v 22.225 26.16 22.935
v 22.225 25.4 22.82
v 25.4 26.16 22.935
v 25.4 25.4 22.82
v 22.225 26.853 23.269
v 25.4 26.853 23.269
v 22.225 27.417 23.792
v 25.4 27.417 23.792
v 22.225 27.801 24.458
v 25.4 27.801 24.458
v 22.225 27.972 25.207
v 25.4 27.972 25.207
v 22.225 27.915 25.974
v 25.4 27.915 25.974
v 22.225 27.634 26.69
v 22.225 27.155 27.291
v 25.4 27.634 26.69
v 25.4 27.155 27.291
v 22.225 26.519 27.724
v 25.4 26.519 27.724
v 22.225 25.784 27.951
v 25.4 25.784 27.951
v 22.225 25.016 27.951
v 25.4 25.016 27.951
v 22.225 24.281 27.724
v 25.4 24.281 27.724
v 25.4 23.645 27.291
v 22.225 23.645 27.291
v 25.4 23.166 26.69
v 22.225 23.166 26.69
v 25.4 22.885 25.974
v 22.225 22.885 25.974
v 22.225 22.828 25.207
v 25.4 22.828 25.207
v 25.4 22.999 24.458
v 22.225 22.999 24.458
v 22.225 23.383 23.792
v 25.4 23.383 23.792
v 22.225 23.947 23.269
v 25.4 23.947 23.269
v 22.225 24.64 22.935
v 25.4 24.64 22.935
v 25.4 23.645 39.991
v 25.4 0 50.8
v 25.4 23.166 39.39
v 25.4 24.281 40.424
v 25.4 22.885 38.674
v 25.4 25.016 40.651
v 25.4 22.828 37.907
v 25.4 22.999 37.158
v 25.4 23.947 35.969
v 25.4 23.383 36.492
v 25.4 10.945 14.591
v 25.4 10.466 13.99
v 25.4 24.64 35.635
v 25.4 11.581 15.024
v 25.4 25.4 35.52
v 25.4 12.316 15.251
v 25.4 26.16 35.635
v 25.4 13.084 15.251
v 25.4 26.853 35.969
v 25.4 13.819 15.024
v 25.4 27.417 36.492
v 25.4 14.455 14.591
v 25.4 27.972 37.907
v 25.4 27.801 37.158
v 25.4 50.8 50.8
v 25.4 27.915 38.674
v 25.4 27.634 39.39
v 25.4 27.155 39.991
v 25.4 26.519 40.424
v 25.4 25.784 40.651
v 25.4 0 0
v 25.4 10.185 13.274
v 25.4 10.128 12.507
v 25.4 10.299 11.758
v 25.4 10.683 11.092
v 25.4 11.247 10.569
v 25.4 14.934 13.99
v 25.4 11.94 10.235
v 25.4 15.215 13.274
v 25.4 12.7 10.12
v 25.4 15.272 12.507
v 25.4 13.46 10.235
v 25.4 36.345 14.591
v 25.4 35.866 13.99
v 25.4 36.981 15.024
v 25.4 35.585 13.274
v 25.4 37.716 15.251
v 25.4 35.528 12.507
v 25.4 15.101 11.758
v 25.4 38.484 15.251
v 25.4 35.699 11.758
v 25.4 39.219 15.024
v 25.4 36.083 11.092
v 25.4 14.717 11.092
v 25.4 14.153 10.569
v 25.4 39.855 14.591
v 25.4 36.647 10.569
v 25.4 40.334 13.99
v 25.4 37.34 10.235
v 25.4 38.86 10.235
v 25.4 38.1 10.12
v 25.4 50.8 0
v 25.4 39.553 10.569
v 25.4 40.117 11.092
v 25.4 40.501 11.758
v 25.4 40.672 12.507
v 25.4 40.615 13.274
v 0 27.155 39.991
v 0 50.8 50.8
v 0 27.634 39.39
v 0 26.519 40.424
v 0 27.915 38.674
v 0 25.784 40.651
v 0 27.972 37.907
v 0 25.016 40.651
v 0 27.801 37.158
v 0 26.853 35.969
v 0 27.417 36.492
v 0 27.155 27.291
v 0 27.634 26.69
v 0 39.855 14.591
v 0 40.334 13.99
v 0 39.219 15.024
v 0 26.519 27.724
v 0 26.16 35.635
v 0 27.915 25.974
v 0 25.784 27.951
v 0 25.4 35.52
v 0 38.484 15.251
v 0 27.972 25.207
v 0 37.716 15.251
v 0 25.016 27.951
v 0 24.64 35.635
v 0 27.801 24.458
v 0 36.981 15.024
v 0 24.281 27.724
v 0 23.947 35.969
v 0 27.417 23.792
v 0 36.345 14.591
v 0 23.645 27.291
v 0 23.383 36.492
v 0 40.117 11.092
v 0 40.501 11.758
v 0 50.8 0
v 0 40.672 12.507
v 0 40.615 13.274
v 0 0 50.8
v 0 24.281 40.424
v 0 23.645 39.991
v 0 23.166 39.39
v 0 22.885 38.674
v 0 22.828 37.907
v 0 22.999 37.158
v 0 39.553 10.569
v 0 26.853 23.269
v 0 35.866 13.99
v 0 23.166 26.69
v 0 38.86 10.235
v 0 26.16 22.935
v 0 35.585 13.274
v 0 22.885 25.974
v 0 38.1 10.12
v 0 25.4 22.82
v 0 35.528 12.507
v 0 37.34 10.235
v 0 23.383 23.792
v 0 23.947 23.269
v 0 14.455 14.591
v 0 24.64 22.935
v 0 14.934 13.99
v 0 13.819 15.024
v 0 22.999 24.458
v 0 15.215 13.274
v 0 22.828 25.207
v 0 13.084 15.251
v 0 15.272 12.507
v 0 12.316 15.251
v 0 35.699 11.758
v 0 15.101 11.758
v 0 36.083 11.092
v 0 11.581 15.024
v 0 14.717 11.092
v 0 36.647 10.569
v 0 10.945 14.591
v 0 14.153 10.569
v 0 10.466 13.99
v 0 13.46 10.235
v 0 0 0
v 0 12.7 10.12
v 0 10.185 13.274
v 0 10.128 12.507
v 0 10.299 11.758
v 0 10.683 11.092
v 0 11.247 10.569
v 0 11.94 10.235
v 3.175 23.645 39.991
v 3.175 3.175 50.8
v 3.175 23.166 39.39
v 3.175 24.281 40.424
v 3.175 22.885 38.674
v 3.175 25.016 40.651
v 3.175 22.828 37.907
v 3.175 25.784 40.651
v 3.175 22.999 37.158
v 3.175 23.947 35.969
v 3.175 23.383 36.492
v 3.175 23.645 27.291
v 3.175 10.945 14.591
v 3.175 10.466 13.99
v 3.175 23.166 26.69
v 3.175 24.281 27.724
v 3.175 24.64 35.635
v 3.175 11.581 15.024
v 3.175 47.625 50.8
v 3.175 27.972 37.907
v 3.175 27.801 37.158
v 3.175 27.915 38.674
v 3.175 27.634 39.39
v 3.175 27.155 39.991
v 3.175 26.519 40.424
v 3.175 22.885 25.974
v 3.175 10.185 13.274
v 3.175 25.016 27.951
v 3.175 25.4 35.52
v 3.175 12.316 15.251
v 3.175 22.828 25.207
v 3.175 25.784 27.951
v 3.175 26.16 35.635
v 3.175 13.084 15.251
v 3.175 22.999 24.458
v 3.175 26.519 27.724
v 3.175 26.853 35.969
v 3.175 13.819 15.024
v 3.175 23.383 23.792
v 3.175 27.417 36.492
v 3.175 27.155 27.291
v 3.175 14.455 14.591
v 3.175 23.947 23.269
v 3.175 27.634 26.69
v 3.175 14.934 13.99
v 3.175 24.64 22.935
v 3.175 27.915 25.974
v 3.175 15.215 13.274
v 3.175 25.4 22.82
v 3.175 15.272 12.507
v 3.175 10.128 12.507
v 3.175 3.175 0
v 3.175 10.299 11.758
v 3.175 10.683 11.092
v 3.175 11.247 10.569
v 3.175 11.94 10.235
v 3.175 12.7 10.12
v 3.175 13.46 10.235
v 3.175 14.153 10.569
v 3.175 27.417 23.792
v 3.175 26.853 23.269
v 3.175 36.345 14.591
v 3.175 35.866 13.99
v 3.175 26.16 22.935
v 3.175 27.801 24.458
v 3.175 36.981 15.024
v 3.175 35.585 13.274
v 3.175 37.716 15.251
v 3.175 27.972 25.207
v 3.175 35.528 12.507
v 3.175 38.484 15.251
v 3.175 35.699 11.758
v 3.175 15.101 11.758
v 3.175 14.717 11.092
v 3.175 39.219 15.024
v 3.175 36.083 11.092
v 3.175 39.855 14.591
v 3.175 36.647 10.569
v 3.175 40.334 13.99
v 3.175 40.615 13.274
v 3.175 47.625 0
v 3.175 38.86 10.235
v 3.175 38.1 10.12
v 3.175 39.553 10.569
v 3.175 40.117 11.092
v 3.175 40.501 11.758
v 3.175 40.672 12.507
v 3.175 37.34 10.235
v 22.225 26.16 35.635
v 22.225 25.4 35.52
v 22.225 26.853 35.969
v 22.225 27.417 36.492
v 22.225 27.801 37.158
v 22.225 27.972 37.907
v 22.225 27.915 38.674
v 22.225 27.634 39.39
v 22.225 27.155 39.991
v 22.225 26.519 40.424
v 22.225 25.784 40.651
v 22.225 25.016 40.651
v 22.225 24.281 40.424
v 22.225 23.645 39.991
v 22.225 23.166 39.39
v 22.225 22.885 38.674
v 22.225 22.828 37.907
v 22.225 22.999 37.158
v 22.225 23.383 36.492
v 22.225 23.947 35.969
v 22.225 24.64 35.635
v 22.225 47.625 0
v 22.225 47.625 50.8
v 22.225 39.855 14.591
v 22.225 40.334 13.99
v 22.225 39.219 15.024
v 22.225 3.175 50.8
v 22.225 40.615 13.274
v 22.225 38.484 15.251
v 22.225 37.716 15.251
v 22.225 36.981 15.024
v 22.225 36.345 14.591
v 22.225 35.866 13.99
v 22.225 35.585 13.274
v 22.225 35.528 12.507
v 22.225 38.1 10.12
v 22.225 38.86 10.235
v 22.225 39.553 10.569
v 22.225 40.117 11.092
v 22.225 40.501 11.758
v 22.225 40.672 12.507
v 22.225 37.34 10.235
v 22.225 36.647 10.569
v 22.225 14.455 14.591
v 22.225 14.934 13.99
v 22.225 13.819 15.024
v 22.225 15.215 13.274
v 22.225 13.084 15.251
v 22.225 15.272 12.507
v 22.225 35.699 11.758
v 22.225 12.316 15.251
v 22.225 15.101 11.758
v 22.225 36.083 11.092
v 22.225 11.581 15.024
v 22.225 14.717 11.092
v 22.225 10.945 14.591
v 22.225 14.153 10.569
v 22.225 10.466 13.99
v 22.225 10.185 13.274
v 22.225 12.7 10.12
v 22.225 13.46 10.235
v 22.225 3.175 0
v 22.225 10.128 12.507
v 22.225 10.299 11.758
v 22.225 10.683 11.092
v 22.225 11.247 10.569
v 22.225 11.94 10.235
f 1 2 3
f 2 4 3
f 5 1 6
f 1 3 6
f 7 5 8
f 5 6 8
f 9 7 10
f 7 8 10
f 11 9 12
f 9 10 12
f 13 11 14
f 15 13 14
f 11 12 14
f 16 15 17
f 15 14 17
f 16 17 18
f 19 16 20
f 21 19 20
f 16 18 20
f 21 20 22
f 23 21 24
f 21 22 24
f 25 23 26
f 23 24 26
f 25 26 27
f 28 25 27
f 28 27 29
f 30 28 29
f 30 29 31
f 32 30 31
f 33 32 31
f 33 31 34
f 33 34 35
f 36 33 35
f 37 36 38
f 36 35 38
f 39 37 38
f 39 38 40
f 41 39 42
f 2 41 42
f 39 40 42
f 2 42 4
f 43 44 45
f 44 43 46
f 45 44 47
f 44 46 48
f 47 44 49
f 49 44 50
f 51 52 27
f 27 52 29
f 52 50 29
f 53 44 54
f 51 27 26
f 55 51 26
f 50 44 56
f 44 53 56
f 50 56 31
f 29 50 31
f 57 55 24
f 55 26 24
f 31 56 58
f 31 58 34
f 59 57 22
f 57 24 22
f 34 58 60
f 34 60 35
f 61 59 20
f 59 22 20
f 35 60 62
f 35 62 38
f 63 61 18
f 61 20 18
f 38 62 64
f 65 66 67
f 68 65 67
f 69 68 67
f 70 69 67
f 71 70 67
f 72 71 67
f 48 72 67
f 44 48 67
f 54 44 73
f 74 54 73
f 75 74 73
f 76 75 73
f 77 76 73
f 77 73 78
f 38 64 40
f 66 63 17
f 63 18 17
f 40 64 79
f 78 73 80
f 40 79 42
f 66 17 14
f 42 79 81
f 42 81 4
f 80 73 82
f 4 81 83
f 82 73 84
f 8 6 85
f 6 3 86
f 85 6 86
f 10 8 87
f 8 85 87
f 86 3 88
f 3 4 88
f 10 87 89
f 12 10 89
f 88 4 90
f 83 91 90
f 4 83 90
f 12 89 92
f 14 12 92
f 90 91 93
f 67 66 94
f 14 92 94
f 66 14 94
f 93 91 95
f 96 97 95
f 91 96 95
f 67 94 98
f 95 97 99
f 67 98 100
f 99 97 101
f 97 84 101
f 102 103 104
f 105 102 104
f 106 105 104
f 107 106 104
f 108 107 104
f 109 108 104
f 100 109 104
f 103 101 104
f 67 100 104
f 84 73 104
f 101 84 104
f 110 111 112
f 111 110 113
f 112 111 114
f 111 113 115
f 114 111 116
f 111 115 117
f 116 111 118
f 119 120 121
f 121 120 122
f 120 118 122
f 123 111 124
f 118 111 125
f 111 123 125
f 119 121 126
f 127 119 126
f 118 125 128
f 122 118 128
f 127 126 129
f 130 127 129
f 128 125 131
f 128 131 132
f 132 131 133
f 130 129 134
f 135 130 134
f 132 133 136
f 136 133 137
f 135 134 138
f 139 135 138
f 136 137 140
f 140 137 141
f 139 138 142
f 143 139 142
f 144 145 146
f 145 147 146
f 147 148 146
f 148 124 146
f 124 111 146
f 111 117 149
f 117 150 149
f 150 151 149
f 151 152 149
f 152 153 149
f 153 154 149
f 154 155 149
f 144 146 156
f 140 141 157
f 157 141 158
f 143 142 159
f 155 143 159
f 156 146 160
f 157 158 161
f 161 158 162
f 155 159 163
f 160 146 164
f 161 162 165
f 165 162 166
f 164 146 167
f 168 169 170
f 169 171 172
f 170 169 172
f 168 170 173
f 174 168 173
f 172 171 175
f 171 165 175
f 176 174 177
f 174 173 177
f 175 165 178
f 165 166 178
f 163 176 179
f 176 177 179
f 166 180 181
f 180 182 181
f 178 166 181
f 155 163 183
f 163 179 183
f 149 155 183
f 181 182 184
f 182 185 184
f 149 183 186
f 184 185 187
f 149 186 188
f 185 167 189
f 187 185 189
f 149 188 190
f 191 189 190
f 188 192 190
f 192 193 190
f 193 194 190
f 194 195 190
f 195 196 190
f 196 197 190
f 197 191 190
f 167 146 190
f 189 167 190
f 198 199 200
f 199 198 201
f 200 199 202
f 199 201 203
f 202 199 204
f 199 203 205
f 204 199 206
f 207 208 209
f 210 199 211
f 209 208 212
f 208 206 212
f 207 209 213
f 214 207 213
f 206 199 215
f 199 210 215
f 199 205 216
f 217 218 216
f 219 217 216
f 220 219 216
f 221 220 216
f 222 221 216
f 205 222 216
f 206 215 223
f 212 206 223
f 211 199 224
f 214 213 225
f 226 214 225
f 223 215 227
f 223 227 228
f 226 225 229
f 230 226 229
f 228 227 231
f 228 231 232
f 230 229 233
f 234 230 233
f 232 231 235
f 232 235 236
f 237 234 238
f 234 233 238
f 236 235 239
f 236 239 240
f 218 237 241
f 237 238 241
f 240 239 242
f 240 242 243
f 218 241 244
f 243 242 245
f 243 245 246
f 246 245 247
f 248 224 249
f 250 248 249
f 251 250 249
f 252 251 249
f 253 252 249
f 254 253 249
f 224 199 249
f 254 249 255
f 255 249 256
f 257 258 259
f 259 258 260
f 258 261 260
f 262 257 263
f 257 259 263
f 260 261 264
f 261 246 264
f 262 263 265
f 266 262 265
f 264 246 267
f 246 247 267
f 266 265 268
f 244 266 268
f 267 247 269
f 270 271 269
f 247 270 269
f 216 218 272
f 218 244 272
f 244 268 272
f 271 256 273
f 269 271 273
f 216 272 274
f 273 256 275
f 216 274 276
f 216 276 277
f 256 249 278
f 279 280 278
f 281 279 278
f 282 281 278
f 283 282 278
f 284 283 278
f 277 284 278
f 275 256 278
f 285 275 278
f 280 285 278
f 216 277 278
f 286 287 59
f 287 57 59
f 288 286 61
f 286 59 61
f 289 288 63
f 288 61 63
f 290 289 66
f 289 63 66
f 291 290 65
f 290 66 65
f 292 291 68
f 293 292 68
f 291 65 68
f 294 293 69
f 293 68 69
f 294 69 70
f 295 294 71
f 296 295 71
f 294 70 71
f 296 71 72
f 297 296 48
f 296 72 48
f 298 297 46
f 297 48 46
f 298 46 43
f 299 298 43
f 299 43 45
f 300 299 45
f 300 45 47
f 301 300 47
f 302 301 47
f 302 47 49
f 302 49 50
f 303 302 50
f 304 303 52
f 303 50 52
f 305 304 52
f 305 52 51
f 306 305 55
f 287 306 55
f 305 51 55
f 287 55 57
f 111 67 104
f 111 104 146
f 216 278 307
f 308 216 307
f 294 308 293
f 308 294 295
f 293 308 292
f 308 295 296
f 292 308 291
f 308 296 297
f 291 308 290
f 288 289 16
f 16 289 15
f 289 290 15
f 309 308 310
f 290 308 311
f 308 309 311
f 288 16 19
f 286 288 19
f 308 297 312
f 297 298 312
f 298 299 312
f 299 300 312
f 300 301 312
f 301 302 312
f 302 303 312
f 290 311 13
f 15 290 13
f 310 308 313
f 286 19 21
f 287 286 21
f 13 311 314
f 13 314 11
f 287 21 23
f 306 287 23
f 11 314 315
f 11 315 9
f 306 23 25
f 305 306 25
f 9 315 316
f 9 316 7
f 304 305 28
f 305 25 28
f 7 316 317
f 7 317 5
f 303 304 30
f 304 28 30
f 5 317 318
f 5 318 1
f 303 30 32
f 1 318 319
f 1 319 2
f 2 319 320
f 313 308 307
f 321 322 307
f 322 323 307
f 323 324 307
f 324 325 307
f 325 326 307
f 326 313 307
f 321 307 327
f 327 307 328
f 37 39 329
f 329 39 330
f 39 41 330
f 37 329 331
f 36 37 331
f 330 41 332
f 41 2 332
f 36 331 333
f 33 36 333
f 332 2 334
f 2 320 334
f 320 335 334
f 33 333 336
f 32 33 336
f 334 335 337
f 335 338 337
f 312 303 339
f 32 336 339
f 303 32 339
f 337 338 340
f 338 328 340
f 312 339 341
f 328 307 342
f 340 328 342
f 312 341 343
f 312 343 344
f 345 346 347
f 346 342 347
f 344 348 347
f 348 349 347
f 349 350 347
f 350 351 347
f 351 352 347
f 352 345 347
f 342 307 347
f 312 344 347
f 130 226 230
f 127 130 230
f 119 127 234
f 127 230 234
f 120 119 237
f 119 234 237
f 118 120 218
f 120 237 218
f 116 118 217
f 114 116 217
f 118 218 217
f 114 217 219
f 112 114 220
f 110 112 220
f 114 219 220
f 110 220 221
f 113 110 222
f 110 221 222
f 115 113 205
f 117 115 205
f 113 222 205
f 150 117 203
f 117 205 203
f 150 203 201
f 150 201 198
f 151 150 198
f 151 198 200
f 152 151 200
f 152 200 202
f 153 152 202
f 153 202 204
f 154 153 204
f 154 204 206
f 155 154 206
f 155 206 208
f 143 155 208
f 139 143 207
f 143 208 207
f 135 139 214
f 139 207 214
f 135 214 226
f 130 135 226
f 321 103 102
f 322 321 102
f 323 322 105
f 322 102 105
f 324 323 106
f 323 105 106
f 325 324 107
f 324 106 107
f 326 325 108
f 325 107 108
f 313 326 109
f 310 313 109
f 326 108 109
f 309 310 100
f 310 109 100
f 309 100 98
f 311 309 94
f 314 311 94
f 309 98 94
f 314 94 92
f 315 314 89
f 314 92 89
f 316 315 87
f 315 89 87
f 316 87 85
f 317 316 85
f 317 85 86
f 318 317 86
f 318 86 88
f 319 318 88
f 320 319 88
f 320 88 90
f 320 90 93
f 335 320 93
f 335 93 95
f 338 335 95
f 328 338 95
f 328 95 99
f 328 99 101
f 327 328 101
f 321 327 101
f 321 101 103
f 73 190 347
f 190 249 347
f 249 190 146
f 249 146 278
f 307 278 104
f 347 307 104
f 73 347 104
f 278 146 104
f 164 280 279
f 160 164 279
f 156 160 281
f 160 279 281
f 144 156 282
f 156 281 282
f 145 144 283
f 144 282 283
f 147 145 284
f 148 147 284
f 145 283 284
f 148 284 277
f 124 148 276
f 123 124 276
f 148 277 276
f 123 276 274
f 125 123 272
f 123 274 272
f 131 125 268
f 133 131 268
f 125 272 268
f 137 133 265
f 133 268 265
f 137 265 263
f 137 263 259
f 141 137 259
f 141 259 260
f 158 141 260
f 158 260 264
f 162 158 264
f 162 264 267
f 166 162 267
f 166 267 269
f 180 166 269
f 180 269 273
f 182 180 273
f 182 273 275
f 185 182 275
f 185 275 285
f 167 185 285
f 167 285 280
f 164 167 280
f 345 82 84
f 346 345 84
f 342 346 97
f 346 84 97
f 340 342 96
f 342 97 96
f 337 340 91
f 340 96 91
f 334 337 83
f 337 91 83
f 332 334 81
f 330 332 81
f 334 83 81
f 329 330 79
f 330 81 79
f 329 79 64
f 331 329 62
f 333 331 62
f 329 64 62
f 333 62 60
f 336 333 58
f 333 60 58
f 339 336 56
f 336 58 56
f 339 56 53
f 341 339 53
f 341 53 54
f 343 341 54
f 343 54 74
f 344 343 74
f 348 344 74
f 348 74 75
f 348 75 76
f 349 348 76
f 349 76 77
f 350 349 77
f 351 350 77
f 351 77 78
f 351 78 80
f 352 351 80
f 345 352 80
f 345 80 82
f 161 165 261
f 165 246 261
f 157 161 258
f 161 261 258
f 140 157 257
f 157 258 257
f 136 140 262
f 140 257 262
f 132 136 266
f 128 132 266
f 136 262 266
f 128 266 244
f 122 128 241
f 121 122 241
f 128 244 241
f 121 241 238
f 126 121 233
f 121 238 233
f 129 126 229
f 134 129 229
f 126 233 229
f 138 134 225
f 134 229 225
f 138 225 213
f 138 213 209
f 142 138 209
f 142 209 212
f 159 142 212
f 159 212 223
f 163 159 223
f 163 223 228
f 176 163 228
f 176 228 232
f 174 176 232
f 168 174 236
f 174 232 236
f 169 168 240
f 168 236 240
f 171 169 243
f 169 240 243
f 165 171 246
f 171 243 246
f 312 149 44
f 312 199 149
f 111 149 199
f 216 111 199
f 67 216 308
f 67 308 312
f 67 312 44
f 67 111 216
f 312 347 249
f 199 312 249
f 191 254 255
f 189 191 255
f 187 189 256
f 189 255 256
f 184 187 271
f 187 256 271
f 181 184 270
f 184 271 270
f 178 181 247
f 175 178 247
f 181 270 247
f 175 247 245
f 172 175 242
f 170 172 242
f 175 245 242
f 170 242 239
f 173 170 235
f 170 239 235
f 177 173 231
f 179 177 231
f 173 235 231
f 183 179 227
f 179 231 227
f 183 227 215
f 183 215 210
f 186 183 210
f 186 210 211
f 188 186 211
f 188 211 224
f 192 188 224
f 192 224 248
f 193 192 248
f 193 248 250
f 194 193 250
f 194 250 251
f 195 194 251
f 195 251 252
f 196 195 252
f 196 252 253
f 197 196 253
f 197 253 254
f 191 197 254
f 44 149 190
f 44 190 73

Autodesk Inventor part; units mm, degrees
ref_plane "YZ Plane" through (0, 0, 0) normal (1, 0, 0) x (0, 1, 0)
ref_plane "XZ Plane" through (0, 0, 0) normal (0, 1, 0) x (-1, 0, 0)
ref_plane "XY Plane" through (0, 0, 0) normal (0, 0, 1) x (1, 0, 0)
sketch "Sketch1" plane through (0, 0, 0) normal (0, 0, 1) x (1, 0, 0)
  line L0 (0, 0) -> (25.4, 0)
  line L1 (25.4, 0) -> (25.4, 50.8)
  line L2 (25.4, 50.8) -> (0, 50.8)
  line L3 (0, 50.8) -> (0, 0)
  line L4 (3.175, 47.625) -> (22.225, 47.625)
  line L5 (22.225, 47.625) -> (22.225, 3.175)
  line L6 (22.225, 3.175) -> (3.175, 3.175)
  line L7 (3.175, 3.175) -> (3.175, 47.625)
  dimension "d0" = 25.4
  dimension "d1" = 50.8
  dimension "d2" = 3.175
extrude "Extrusion1" add sketch "Sketch1" along normal blind 50.8
sketch "Sketch2" plane through (25.4, 0, 0) normal (1, 0, 0) x (0, 0, -1)
  line L0 (0, 50.8) -> (0, 0) construction
  line L1 (0, 0) -> (-12.7, 0) construction
  line L2 (0, 0) -> (-50.8, 0) construction
  line L3 (-12.7, 0) -> (-12.7, 12.7) construction
  line L4 (-12.7, 12.7) -> (-12.7, 38.1) construction
  circle A0 centre (-12.7, 12.7) radius 2.5797
  circle A1 centre (-12.7, 38.1) radius 2.5797
  dimension "d5" = 12.7
  dimension "d6" = 12.7
  dimension "d7" = 25.4
  dimension "d8" = 5.1594
extrude "Extrusion2" cut sketch "Sketch2" against normal blind 50.8
sketch "Sketch3" plane through (25.4, 0, 0) normal (1, 0, 0) x (0, 0, -1)
  line L0 (-50.8, 3.175) -> (-50.8, 47.625) projected
  line L1 (-50.8, 25.4) -> (-38.1, 25.4) construction
  line L2 (-38.1, 25.4) -> (-25.4, 25.4) construction
  circle A0 centre (-38.1, 25.4) radius 2.5797
  circle A1 centre (-25.4, 25.4) radius 2.5797
  point P0 (0, 0)
  dimension "d11" = 12.7
  dimension "d12" = 12.7
  dimension "d13" = 5.1594
extrude "Extrusion3" cut sketch "Sketch3" against normal blind 25.4
properties part number "2in 1x2"
